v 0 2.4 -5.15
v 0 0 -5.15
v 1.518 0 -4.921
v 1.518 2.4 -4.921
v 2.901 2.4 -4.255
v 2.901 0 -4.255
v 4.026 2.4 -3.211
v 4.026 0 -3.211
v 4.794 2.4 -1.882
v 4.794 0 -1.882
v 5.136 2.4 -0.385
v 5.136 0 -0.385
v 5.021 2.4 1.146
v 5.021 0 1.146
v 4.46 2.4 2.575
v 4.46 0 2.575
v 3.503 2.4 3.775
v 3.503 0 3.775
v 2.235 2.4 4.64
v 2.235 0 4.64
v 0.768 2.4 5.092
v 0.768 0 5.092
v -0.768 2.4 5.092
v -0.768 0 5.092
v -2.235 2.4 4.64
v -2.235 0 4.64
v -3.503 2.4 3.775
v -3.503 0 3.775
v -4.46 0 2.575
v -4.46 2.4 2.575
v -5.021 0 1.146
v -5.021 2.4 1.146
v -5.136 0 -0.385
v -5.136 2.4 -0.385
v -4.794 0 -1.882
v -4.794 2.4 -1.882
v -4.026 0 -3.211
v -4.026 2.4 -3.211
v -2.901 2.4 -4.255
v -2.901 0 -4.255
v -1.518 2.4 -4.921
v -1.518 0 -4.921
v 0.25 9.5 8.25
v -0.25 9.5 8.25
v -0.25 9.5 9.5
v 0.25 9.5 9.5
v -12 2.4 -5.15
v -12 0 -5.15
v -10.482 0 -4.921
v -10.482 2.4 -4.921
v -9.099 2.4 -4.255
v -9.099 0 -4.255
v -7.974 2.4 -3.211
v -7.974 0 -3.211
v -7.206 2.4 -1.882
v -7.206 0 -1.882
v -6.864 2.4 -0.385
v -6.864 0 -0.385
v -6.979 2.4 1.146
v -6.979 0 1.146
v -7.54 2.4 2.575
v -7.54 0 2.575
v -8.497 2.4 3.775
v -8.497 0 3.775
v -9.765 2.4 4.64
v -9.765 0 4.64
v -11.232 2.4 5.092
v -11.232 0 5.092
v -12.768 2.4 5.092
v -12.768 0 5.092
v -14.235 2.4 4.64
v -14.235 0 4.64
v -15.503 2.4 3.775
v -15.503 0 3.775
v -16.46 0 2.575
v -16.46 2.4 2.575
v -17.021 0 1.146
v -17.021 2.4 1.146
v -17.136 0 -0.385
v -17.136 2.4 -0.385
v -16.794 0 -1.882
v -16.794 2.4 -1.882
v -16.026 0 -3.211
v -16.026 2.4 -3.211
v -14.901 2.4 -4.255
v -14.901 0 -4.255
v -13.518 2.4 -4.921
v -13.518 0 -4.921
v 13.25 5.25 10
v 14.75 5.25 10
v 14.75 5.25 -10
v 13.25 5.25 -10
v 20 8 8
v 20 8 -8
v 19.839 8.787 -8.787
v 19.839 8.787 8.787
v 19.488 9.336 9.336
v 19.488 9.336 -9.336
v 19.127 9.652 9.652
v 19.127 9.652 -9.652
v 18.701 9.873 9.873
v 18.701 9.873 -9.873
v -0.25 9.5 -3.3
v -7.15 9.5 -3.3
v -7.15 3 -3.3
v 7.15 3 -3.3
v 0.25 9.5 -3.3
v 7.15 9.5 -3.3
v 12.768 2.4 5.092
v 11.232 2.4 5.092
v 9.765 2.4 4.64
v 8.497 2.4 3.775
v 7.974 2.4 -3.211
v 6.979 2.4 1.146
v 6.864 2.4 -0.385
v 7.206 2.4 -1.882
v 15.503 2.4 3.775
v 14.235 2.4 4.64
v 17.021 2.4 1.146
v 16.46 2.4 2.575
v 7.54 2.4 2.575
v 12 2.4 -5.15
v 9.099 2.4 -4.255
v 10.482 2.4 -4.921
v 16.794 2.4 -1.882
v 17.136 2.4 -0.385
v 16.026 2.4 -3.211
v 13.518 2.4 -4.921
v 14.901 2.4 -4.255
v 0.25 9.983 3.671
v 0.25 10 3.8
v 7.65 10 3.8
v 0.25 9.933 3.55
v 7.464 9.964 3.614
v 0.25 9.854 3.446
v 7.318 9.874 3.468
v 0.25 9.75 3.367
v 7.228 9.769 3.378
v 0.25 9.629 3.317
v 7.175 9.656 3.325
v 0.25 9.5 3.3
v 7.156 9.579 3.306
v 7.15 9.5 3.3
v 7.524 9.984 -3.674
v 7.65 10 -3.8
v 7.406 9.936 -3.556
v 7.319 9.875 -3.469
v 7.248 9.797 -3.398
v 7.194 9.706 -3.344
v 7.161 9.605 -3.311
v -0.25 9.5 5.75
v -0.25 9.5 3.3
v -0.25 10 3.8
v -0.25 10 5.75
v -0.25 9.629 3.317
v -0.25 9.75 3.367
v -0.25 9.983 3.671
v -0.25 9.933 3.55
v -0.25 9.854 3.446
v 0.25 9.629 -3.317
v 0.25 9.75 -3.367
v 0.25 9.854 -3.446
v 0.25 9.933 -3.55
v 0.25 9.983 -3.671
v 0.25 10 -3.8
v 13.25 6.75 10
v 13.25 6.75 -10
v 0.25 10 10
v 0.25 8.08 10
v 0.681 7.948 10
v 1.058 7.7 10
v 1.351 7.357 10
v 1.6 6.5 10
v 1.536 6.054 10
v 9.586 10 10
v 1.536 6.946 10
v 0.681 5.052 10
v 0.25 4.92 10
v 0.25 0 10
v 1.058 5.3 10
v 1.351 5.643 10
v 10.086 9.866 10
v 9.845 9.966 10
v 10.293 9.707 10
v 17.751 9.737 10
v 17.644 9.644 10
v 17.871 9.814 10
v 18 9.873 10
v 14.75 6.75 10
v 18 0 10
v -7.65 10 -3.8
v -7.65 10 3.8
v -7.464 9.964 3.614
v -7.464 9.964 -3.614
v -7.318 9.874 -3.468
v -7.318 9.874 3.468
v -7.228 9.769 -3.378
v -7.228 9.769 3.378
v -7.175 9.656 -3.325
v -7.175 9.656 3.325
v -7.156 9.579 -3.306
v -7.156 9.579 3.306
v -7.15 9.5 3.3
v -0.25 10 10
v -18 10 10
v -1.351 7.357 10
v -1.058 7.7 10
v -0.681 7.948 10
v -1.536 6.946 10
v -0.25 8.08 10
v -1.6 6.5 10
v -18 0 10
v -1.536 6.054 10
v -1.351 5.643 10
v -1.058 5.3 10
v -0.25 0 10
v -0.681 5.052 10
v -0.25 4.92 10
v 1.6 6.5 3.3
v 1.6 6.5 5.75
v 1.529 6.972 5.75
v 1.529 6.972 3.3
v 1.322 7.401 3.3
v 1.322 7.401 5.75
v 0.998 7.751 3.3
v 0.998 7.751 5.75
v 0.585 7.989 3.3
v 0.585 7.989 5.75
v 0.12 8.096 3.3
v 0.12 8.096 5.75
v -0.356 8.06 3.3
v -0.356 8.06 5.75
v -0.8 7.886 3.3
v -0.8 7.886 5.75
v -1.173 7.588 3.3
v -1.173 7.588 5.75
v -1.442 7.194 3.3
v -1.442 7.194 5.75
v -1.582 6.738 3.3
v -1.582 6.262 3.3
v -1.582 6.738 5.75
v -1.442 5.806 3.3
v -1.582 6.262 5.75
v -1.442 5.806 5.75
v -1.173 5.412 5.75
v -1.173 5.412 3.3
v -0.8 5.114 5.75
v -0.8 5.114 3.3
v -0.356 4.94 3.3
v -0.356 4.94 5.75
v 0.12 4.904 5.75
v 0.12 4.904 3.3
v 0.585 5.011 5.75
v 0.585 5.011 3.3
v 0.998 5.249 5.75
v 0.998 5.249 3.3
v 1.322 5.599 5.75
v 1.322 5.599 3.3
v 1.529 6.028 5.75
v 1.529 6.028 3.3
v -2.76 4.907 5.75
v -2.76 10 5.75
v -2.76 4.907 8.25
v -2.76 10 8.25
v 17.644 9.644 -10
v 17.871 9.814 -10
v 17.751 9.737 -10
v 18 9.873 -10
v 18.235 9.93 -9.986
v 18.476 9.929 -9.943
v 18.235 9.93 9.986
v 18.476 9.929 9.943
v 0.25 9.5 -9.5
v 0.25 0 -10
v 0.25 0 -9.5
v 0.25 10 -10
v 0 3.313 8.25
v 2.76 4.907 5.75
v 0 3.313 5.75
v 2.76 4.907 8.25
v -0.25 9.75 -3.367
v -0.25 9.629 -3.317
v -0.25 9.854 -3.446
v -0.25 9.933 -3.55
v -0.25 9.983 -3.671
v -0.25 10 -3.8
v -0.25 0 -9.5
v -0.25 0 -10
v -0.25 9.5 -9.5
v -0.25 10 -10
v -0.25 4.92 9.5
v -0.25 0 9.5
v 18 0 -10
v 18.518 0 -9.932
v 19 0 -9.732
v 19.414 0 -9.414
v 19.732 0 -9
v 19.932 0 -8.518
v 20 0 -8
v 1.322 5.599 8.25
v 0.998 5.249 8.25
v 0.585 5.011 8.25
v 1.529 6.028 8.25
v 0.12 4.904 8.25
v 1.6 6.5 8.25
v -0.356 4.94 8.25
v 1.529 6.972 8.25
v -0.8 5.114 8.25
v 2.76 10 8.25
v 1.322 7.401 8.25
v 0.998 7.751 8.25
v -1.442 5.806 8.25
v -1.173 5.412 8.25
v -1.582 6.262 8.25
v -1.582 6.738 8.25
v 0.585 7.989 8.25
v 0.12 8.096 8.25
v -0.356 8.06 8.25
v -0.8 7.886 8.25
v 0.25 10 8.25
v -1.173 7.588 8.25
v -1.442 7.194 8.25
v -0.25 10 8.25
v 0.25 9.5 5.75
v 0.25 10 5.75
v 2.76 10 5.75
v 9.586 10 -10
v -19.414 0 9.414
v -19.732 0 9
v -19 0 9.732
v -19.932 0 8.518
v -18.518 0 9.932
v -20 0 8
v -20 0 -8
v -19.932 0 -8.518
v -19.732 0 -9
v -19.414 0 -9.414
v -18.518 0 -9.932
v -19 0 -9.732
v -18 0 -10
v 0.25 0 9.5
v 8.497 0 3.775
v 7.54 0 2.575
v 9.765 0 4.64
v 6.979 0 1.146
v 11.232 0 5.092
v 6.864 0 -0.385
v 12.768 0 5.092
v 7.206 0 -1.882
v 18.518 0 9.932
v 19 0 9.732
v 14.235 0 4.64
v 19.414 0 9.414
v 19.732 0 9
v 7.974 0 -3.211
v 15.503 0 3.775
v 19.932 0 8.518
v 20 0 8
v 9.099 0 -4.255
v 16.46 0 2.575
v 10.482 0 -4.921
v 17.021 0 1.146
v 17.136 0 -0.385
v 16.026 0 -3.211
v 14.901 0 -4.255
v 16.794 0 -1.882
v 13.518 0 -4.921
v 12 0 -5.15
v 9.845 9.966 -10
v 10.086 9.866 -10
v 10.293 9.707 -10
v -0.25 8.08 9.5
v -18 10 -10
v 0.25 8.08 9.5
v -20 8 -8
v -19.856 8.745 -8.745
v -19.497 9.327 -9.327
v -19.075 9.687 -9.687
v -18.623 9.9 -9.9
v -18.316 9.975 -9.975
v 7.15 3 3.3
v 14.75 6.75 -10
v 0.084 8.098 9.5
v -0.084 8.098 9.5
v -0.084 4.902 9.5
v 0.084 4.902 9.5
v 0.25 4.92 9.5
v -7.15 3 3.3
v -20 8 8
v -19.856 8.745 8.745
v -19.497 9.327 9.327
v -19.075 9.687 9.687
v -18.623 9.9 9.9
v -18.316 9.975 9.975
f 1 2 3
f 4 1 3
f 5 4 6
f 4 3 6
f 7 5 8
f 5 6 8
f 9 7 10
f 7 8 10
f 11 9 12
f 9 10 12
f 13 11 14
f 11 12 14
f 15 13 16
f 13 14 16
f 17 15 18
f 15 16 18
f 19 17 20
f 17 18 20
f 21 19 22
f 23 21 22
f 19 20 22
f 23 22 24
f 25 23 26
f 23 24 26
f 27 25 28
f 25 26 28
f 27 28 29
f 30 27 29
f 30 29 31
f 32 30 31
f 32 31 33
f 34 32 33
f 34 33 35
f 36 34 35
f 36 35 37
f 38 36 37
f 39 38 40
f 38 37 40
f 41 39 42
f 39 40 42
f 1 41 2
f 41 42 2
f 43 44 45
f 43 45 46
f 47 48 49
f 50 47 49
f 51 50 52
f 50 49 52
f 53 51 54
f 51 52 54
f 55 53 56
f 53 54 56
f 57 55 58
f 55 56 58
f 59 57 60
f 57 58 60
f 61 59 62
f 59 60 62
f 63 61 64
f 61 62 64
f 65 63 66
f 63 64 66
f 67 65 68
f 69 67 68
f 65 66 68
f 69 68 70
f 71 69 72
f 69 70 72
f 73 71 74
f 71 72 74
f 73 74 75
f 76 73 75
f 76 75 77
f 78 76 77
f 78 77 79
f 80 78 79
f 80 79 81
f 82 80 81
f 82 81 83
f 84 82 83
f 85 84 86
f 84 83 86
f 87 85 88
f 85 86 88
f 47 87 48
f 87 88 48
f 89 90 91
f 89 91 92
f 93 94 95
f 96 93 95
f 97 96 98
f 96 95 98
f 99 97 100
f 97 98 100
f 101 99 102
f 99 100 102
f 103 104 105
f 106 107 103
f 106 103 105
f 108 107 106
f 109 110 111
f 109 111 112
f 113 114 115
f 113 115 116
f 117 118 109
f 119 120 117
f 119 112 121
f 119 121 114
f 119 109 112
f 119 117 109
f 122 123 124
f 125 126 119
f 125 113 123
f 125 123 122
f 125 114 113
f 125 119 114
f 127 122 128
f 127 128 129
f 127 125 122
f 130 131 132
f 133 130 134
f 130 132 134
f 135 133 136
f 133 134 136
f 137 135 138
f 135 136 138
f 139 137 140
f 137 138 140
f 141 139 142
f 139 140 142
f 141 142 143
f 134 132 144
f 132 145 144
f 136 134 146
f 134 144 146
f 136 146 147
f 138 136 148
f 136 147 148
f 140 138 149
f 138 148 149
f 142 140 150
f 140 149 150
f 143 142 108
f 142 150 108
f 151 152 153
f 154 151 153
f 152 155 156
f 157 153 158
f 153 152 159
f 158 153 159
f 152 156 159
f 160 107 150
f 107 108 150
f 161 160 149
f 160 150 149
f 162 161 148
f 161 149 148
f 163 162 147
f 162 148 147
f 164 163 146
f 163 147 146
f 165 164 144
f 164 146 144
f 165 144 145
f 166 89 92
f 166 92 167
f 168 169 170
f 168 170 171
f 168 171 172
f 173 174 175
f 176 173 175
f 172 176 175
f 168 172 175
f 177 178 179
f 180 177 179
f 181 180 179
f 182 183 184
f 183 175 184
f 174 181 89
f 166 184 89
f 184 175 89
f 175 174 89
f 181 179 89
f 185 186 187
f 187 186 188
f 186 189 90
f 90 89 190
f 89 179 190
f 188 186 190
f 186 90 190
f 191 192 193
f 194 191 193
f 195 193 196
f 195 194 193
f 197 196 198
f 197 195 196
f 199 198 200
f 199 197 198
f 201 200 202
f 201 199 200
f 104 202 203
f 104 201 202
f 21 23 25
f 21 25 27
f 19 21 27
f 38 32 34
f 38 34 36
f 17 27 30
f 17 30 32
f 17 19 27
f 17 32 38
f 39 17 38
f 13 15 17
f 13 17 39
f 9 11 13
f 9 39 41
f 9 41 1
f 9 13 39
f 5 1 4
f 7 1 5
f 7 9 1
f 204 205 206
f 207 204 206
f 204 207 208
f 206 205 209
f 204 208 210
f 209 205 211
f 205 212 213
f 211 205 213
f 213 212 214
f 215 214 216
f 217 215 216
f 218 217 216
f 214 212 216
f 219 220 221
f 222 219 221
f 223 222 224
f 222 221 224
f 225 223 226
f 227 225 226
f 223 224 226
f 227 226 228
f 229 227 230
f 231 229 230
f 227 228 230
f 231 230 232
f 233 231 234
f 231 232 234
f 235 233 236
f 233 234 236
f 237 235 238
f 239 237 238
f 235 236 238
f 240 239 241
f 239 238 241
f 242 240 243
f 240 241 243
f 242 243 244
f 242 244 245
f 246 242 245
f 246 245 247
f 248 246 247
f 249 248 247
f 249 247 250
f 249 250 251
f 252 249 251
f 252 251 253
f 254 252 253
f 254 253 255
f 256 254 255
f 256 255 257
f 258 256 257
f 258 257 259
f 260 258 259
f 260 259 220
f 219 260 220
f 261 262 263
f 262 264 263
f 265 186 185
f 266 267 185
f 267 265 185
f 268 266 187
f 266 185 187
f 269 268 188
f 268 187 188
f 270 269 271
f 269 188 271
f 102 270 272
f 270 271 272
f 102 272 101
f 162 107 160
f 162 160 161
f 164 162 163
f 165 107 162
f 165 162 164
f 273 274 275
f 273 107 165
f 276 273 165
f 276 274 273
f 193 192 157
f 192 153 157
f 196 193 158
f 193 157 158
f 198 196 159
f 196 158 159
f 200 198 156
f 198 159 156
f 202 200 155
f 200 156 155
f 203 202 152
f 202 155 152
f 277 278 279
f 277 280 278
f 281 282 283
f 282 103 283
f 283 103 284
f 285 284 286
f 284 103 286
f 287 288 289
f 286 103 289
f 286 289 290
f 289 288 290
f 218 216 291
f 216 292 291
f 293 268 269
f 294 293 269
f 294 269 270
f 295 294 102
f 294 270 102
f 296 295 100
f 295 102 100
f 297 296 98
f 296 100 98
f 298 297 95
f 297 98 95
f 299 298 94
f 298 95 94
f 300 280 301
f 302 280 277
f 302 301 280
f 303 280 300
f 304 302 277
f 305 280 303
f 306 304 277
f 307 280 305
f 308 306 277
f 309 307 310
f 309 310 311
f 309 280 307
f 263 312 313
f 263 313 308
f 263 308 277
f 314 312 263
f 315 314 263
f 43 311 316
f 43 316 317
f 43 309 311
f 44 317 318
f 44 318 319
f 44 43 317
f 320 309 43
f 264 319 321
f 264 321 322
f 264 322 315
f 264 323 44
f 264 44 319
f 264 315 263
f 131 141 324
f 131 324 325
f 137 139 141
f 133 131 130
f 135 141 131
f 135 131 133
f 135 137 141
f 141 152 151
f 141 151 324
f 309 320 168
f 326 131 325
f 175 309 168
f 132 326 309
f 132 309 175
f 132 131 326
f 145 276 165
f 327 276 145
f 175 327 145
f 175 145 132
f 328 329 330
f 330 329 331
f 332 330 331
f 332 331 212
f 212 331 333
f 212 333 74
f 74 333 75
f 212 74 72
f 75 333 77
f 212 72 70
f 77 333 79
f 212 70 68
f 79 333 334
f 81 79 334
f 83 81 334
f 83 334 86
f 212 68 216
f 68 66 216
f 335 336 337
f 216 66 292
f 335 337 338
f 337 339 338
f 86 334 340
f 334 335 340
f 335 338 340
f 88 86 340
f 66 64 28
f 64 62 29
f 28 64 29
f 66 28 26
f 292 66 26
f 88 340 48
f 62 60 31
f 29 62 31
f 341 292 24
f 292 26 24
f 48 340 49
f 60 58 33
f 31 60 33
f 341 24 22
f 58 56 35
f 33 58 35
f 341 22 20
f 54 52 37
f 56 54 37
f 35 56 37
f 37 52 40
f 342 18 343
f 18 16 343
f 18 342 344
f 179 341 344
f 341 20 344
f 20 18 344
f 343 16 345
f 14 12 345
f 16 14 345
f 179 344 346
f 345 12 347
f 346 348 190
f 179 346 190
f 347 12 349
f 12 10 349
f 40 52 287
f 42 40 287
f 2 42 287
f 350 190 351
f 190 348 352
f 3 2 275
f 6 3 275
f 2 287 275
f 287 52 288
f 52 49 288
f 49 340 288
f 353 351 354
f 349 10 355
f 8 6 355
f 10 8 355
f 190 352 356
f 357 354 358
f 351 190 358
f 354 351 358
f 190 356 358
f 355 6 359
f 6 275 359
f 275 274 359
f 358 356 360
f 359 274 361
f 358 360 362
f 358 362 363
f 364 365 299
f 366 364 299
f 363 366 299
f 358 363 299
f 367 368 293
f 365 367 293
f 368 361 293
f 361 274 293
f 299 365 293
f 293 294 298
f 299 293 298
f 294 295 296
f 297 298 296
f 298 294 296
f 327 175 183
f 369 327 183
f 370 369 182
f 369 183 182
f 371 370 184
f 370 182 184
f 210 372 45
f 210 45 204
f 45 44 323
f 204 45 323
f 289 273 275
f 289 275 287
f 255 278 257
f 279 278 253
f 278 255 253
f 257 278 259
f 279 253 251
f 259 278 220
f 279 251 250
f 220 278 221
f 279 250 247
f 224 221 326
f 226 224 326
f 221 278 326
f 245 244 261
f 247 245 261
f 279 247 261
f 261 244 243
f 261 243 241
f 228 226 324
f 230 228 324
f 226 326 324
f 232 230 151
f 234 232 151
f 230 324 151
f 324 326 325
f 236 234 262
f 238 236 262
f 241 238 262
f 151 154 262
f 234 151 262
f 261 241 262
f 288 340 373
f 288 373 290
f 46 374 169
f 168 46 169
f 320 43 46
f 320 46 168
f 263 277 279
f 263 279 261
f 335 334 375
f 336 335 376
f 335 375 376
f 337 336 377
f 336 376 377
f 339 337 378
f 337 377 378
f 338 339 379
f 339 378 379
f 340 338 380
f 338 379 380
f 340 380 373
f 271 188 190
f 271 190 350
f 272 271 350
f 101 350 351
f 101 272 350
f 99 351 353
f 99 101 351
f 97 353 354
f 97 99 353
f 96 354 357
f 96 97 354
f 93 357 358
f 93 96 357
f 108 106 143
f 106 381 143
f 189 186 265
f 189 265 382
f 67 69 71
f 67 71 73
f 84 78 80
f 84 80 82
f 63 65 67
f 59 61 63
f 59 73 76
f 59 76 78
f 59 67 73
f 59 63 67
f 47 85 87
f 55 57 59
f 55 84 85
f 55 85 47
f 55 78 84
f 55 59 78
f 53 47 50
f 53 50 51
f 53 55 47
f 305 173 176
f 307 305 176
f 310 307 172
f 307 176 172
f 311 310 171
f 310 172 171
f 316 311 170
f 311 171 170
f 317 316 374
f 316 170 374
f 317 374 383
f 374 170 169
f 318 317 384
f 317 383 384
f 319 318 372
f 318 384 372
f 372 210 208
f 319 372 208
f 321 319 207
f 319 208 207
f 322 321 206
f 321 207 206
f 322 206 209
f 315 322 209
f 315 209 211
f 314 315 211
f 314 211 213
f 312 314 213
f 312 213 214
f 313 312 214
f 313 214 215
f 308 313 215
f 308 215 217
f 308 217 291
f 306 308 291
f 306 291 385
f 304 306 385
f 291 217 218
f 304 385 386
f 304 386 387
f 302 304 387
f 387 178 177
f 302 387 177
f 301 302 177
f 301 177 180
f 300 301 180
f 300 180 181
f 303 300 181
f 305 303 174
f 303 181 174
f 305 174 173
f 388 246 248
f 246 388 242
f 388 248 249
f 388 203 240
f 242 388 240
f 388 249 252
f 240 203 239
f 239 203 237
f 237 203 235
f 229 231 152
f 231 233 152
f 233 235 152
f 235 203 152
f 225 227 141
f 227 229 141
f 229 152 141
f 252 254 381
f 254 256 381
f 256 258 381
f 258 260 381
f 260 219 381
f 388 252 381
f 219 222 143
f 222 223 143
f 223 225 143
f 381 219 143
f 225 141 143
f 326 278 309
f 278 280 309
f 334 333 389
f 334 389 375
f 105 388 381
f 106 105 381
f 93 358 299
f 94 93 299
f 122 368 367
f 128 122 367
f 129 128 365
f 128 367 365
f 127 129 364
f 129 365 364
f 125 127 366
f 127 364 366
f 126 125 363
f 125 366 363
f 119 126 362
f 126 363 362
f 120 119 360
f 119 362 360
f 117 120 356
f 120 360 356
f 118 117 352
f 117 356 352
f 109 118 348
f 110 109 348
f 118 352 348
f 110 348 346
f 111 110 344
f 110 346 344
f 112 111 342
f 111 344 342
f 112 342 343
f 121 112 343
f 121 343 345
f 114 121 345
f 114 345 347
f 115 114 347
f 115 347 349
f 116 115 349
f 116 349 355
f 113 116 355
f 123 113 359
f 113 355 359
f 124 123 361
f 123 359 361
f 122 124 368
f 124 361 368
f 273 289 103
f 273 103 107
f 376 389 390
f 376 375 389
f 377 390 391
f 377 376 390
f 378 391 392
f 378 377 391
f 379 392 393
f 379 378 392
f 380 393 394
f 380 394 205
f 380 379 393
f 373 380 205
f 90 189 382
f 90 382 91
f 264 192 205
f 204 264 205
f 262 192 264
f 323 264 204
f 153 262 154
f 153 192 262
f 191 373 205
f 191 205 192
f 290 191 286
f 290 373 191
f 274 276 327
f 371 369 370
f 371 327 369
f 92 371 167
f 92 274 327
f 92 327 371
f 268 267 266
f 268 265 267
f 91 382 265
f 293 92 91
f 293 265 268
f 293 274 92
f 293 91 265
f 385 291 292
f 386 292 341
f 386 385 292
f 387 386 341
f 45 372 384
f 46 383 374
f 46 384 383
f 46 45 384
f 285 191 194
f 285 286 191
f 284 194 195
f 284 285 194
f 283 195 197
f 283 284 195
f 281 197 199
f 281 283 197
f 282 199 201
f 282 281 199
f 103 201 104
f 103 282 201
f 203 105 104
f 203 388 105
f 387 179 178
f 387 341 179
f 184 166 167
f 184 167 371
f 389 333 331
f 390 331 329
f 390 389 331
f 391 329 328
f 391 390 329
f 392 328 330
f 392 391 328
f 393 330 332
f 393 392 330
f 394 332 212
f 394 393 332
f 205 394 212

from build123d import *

# Parameters (mm, degrees)
SKETCH1_W           = 40
SKETCH1_H           = 20
BOSS_EXTRUDE1_DEPTH = 10
SKETCH2_R           = 5.15
CUT_EXTRUDE1_DEPTH  = 2.4
CUT_EXTRUDE2_DEPTH  = 31
FILLET1_R           = 2
SKETCH4_W           = 0.5
SKETCH4_H           = 10
CUT_EXTRUDE3_DEPTH  = 0.5
SKETCH5_W           = 0.5
SKETCH5_H           = 20
CUT_EXTRUDE4_DEPTH  = 0.5
SKETCH6_W           = 0.5
SKETCH6_H           = 10
CUT_EXTRUDE5_DEPTH  = 0.5
FILLET2_R           = 1
SKETCH8_W           = 14.3
SKETCH8_H           = 7
CUT_EXTRUDE7_DEPTH  = 3.3
SKETCH9_R           = 1.6
CUT_EXTRUDE8_DEPTH  = 10
CUT_EXTRUDE9_DEPTH  = 1.25
FILLET4_R           = 0.5


# Some blends are built 0.0001 mm under size
with BuildPart() as part:
    # Sketch1 → Boss-Extrude1 (new body)
    with BuildSketch(Plane(origin=(0, 0, 0), x_dir=(1, 0, 0), z_dir=(0, 1, 0))):
        Rectangle(SKETCH1_W, SKETCH1_H)
    extrude(amount=BOSS_EXTRUDE1_DEPTH)

    # Sketch2 → Cut-Extrude1 (cut)
    with BuildSketch(Plane.XZ):
        with Locations(Location((0, 0, 0), (0, 0, 270))):
            Circle(SKETCH2_R)
        with Locations(Location((12, 0, 0), (0, 0, 270))):
            Circle(SKETCH2_R)
        with Locations(Location((-12, 0, 0), (0, 0, 270))):
            Circle(SKETCH2_R)
    extrude(amount=-CUT_EXTRUDE1_DEPTH, mode=Mode.SUBTRACT)

    # Sketch3 → Cut-Extrude2 (cut, through all)
    with BuildSketch(Plane.XY.offset(10)):
        Polygon((18, 10), (14.75, 6.75), (14.75, 5.25), (13.25, 5.25), (13.25, 6.75), (10, 10), align=None)
    extrude(amount=-CUT_EXTRUDE2_DEPTH, mode=Mode.SUBTRACT)

    # Fillet1
    fillet1_edges = [part.edges().sort_by_distance(p)[0] for p in [
        (20, 10, 0),
        (-20, 10, 0),
        (-20, 5, -10),
        (20, 5, -10),
        (20, 5, 10),
        (-20, 5, 10),
    ]]
    fillet(fillet1_edges, radius=FILLET1_R - 0.0001)  # a hair under: the kernel refuses the full size

    # Sketch4 → Cut-Extrude3 (cut)
    with BuildSketch(Plane.XY.offset(10)):
        with Locations((0, 5)):
            Rectangle(SKETCH4_W, SKETCH4_H)
    extrude(amount=-CUT_EXTRUDE3_DEPTH, mode=Mode.SUBTRACT)

    # Sketch5 → Cut-Extrude4 (cut)
    with BuildSketch(Plane(origin=(0, 10, 0), x_dir=(1, 0, 0), z_dir=(0, 1, 0))):
        Rectangle(SKETCH5_W, SKETCH5_H)
    extrude(amount=-CUT_EXTRUDE4_DEPTH, mode=Mode.SUBTRACT)

    # Sketch6 → Cut-Extrude5 (cut)
    with BuildSketch(Plane(origin=(0, 0, -10), x_dir=(-1, 0, 0), z_dir=(0, 0, -1))):
        with Locations((0, 5)):
            Rectangle(SKETCH6_W, SKETCH6_H)
    extrude(amount=-CUT_EXTRUDE5_DEPTH, mode=Mode.SUBTRACT)

    # Fillet2
    # the kernel refuses this fillet: 1 mm, written as the material it takes off along each edge
    with BuildSketch(Plane(origin=(10, 10, 11.035533906), x_dir=(0.7071067811865476, -0.7071067811865476, 0), z_dir=(0, 0, -1))) as fillet2_piece_1:
        with BuildLine():
            CenterArc((FILLET2_R * 0.414213562373, FILLET2_R), FILLET2_R, 225, 45)
            Line((-FILLET2_R * 0.292893218813, FILLET2_R * 0.292893218813), (0, 0))
            Line((0, 0), (FILLET2_R * 0.414213562373, 0))
        make_face()
    extrude(amount=22.071067812, mode=Mode.SUBTRACT)
    with BuildSketch(Plane(origin=(18, 10, 11.781961717), x_dir=(-0.7071067811865406, -0.7071067811865547, 0), z_dir=(0, 0, -1))) as fillet2_piece_2:
        with BuildLine():
            CenterArc((0.504002289, -1), FILLET2_R, 90, 65.527591719)
            Line((-0.406158578, -0.585745012), (-0.497174665, -0.544319513))
            ThreePointArc((-0.497174665, -0.544319513), (-0.070781389, 0.070639967), (-0.070710678, 0.070710678))
            Line((-0.070710678, 0.070710678), (0, 0.1))
            Line((0, 0.1), (0.504002289, 0.1))
            Line((0.504002289, 0.1), (0.504002289, 0))
        make_face()
    extrude(amount=23.563923435, mode=Mode.SUBTRACT)

    # Sketch8 → Cut-Extrude7 (cut, symmetric)
    with BuildSketch(Plane.XY):
        with Locations((0, 6.5)):
            Rectangle(SKETCH8_W, SKETCH8_H)
    extrude(amount=CUT_EXTRUDE7_DEPTH, both=True, mode=Mode.SUBTRACT)

    # Sketch9 → Cut-Extrude8 (cut)
    with BuildSketch(Plane.XY.offset(10)):
        with Locations((0, 6.5)):
            Circle(SKETCH9_R)
    extrude(amount=-CUT_EXTRUDE8_DEPTH, mode=Mode.SUBTRACT)

    # Sketch10 → Cut-Extrude9 (cut, symmetric)
    with BuildSketch(Plane.XY.offset(7)):
        Polygon((-2.76, 8.093486743), (-2.76, 10), (2.76, 10), (2.76, 8.081939738), (2.76, 4.906513257), (0, 3.313026514), (-2.76, 4.906513257), align=None)
    extrude(amount=CUT_EXTRUDE9_DEPTH, both=True, mode=Mode.SUBTRACT)

    # Fillet4
    fillet4_edges = [part.edges().sort_by_distance(p)[0] for p in [
        (3.7, 10, -3.3),
        (7.15, 10, 0),
        (3.7, 10, 3.3),
        (-3.7, 10, 3.3),
        (-7.15, 10, 0),
        (-3.7, 10, -3.3),
    ]]
    fillet(fillet4_edges, radius=FILLET4_R)


solid = part.part
